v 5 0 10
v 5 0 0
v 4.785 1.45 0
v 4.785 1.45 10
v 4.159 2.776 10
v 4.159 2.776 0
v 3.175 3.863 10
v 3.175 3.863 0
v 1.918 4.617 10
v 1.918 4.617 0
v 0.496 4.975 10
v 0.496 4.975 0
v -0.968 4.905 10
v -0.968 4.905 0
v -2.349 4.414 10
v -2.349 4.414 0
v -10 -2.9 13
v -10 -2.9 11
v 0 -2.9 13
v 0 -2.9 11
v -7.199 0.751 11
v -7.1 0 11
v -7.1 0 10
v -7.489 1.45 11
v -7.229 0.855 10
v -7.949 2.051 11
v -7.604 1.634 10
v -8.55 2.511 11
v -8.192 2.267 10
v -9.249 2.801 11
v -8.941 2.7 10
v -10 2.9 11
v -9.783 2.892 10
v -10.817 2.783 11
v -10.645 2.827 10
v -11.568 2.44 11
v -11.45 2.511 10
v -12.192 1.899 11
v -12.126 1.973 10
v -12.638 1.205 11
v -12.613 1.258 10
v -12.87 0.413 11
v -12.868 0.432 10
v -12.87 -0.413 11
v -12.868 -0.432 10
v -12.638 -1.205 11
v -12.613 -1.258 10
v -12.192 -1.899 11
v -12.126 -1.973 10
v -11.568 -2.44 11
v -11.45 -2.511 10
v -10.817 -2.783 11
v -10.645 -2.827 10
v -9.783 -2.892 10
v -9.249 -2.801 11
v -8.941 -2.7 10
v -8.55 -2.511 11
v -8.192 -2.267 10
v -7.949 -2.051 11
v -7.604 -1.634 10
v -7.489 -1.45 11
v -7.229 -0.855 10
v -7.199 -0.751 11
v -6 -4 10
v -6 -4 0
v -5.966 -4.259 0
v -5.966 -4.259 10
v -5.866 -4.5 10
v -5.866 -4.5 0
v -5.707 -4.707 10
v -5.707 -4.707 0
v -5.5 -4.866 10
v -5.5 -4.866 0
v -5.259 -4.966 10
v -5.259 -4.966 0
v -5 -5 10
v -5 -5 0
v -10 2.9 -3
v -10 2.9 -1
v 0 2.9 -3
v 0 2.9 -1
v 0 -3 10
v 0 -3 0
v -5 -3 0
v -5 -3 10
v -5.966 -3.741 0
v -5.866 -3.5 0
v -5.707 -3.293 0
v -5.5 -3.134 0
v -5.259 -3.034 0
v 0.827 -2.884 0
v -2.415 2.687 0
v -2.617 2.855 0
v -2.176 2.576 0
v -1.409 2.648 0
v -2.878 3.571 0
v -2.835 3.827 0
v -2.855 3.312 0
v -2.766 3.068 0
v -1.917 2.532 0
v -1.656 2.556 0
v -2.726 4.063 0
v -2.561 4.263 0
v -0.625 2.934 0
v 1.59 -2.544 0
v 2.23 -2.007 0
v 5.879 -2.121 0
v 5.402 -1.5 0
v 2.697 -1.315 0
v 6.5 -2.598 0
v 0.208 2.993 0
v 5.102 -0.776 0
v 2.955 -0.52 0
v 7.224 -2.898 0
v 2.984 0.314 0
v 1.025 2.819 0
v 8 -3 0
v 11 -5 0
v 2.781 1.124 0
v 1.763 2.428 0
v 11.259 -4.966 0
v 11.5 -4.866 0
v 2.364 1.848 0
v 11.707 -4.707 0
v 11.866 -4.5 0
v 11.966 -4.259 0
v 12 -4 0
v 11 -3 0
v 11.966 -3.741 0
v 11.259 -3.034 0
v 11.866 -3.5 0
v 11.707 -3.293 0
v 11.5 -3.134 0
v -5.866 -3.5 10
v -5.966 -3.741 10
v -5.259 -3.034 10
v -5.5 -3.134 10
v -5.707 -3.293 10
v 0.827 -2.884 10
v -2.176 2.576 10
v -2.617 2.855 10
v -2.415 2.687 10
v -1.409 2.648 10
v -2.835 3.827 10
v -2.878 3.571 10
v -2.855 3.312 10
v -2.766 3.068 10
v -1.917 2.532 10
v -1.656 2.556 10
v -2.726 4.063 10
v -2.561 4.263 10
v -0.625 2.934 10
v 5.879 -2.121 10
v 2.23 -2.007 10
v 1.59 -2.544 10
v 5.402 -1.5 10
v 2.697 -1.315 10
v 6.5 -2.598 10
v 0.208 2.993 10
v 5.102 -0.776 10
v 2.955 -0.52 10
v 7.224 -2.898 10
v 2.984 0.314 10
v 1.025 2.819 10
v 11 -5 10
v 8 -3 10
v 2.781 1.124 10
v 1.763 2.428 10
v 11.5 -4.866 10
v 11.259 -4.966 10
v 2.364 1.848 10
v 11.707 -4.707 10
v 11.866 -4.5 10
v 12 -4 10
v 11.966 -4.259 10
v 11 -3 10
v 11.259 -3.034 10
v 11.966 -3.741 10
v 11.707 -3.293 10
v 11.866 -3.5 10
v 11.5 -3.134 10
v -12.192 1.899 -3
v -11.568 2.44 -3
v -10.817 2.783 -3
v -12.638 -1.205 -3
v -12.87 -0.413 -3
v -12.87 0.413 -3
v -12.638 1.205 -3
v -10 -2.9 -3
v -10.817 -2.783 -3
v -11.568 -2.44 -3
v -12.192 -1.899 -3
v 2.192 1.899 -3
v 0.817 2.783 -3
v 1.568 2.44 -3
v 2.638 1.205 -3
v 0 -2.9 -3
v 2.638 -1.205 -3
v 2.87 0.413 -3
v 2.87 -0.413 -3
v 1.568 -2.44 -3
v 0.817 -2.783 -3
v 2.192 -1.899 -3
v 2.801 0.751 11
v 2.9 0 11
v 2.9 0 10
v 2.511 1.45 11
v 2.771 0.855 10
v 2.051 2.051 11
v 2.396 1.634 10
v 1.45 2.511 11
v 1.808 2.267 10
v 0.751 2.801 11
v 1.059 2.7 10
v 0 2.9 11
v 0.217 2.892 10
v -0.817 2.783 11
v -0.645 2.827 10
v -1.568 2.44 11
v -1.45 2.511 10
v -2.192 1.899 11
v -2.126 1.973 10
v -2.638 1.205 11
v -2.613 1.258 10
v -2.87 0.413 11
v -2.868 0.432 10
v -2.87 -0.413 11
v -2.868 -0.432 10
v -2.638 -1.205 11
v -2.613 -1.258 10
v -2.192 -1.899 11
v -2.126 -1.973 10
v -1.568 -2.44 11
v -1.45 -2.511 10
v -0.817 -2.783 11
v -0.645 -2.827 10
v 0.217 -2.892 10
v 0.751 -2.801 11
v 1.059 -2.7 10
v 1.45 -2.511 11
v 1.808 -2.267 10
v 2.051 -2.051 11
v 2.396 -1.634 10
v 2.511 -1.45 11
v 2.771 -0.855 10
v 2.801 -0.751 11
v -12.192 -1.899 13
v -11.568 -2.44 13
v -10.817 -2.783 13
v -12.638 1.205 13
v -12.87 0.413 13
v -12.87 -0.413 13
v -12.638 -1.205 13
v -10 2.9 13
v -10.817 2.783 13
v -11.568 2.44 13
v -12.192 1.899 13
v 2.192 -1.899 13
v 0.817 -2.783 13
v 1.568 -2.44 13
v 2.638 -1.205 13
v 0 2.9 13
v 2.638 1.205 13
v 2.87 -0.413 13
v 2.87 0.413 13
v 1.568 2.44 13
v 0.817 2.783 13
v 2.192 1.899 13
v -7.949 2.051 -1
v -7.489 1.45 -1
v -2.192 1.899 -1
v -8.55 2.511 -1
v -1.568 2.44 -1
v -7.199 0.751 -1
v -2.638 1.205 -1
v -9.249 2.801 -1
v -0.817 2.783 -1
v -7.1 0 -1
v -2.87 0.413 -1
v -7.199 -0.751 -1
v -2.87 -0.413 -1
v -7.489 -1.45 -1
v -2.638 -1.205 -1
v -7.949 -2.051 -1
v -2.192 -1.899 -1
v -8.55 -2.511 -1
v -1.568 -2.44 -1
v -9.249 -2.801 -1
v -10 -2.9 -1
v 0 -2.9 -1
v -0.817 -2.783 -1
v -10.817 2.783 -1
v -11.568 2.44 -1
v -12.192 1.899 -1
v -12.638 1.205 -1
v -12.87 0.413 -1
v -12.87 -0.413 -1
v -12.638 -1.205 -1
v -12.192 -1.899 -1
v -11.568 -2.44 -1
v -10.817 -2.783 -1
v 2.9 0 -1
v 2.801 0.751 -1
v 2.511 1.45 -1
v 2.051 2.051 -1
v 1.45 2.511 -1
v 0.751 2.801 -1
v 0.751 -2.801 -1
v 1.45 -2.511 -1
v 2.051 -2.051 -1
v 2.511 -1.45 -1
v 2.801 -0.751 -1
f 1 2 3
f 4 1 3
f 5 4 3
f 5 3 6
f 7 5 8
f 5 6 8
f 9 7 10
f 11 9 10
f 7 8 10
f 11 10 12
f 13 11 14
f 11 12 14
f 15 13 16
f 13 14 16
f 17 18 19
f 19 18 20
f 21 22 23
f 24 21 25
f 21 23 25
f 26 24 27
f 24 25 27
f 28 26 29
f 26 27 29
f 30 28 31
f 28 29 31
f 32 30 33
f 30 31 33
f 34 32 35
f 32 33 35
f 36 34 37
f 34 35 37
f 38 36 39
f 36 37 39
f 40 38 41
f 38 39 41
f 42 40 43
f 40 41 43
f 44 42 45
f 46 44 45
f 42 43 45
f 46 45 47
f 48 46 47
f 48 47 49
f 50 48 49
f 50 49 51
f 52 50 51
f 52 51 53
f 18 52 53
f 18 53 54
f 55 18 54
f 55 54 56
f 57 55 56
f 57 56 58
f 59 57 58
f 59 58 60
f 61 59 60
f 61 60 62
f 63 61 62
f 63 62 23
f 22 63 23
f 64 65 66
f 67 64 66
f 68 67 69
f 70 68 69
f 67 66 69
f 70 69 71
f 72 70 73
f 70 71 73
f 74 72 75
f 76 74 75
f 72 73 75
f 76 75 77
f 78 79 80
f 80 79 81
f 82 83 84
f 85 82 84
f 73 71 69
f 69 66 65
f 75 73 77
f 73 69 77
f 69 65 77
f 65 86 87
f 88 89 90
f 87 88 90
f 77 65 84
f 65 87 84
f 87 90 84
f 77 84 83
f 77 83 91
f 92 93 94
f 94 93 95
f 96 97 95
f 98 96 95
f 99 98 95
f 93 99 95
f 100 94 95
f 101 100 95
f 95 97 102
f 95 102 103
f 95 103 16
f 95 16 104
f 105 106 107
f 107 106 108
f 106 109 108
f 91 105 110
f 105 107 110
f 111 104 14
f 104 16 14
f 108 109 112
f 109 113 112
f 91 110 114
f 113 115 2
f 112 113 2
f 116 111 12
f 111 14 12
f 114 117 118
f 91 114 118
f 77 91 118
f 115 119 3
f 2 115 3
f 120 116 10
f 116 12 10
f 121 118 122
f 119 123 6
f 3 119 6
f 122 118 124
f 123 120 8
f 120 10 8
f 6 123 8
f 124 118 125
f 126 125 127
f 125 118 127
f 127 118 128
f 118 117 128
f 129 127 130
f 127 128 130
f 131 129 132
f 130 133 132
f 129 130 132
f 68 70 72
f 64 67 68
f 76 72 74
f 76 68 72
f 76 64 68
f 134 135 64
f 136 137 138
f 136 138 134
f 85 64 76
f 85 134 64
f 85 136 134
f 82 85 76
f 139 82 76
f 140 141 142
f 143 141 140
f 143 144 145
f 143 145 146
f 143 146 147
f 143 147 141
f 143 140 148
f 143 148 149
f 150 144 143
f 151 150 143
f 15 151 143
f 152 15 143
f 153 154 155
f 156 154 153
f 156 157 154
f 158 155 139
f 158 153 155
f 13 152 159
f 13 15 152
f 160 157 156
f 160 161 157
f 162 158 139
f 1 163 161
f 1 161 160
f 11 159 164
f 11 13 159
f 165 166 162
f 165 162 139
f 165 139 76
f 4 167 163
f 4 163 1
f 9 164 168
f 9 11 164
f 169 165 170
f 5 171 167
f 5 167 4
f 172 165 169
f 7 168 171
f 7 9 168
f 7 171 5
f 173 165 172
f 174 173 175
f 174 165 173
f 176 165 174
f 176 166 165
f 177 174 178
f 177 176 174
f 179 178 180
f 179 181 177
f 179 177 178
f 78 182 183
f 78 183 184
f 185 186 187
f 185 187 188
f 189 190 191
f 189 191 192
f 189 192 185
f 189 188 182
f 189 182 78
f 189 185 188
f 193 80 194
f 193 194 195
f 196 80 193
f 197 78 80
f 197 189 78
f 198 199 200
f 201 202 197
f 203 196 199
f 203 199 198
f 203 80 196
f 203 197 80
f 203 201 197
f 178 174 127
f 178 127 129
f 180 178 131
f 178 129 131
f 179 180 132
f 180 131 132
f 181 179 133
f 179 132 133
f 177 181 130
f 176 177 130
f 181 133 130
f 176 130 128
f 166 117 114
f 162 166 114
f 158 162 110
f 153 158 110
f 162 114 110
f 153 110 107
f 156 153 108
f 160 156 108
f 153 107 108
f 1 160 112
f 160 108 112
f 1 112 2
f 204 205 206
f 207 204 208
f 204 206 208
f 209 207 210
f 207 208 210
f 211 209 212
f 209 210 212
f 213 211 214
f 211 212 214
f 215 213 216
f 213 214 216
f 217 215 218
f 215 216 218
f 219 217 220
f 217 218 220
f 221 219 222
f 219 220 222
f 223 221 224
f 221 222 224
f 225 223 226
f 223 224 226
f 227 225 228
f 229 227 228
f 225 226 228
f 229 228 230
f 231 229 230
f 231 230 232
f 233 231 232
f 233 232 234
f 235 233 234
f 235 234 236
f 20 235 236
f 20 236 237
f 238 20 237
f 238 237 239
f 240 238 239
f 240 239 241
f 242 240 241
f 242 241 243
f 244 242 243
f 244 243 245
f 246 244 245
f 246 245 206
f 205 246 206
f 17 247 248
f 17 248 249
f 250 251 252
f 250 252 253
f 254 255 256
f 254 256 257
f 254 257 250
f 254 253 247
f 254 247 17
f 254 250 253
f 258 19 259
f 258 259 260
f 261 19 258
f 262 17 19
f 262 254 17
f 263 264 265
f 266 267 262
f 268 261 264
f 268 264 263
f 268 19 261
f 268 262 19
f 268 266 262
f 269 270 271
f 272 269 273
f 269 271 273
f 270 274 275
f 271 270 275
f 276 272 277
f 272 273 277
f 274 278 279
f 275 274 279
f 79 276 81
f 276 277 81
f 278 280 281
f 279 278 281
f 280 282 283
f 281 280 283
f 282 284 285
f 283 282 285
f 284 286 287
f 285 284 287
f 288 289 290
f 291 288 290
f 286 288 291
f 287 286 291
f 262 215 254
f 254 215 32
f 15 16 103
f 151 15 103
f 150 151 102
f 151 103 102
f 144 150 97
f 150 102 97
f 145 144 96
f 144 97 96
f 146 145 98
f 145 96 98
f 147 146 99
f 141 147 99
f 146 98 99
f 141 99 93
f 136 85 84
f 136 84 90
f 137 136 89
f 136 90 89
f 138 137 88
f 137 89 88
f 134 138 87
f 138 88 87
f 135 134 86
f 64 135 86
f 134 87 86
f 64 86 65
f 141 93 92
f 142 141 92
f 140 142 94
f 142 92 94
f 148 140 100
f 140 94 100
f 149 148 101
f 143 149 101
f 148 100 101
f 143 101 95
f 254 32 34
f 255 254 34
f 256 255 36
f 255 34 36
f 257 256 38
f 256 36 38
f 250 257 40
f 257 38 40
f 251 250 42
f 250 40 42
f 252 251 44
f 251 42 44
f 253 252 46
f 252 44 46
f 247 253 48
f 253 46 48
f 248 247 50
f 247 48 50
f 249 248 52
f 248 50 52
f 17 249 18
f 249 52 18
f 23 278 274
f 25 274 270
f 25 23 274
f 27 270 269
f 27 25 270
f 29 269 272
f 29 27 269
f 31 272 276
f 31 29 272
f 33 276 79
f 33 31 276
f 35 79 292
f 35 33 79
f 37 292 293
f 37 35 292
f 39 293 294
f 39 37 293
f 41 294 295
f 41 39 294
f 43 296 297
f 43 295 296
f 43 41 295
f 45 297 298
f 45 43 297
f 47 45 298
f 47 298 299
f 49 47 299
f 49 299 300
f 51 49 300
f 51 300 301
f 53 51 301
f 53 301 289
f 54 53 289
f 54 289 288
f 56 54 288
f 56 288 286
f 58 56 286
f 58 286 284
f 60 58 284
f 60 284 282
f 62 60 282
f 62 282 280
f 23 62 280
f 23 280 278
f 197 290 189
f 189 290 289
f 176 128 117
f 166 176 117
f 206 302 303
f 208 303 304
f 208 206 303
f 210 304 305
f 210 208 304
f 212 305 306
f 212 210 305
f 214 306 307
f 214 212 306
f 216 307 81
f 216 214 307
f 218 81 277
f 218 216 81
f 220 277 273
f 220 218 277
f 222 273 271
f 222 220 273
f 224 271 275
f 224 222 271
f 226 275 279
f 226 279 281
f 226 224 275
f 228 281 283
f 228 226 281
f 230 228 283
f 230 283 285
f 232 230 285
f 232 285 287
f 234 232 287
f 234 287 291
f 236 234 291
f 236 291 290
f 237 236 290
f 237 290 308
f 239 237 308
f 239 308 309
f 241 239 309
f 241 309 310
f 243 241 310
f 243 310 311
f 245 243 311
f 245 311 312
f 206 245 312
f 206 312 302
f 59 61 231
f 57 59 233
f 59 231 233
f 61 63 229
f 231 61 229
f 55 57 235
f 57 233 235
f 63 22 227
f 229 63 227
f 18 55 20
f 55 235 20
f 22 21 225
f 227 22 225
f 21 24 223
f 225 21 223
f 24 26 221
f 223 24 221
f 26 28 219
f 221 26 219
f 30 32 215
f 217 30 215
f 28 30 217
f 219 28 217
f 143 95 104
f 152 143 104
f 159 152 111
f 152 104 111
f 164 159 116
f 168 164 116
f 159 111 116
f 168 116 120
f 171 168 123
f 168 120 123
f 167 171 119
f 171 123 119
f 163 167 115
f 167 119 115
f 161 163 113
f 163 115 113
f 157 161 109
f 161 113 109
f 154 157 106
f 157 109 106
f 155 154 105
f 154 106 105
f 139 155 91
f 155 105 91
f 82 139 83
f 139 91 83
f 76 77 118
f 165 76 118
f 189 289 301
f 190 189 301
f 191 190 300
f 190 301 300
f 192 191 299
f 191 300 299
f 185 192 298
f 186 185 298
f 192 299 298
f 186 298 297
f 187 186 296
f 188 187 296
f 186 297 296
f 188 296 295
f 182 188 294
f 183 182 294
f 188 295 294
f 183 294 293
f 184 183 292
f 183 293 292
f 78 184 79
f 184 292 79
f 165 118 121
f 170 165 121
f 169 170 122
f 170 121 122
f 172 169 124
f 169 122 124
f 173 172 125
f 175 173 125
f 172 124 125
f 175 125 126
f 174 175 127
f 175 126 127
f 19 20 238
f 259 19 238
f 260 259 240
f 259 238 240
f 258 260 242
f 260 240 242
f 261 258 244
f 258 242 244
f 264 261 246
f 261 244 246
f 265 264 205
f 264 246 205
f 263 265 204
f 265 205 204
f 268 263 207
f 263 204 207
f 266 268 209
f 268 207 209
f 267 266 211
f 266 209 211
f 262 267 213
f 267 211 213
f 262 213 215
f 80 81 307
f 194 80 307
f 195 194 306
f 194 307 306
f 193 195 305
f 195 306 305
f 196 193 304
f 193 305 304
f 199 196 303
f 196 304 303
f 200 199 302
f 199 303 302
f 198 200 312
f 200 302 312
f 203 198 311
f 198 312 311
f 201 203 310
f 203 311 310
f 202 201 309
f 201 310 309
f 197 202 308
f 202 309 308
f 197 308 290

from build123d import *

# Parameters (mm, degrees)
F1_DEPTH      = 10
F2_R          = 2.9
F3_DEPTH      = 11
F3_DEPTH_BACK = 1
F5_DEPTH      = 2
F7_DEPTH      = 2


with BuildPart() as f1:
    # F0 (on Top) → F1 (new body)
    with BuildSketch(Plane.XY):
        with BuildLine():
            ThreePointArc((-1.4094542146, 2.648289791), (2.9107446962, 0.7263369146), (0, -3))
            Line((0, -3), (-5, -3))
            ThreePointArc((-5, -3), (-5.7071067812, -3.2928932188), (-6, -4))
            ThreePointArc((-6, -4), (-5.7071067812, -4.7071067812), (-5, -5))
            Line((-5, -5), (0, -5))
            Line((0, -5), (11, -5))
            ThreePointArc((11, -5), (11.7071067812, -4.7071067812), (12, -4))
            ThreePointArc((12, -4), (11.7071067812, -3.2928932188), (11, -3))
            Line((11, -3), (8, -3))
            ThreePointArc((8, -3), (5.8786796564, -2.1213203436), (5, 0))
            ThreePointArc((5, 0), (2.5743492587, 4.2863417846), (-2.3490903577, 4.4138163183))
            ThreePointArc((-2.3490903577, 4.4138163183), (-2.8648615599, 3.7002091465), (-2.616549623, 2.855462847))
            ThreePointArc((-2.616549623, 2.855462847), (-2.0484283781, 2.5454637808), (-1.4094542146, 2.648289791))
        make_face()
    extrude(amount=F1_DEPTH)


with BuildPart() as f3:
    # F2 (on face) → F3 (new body, two sides)
    with BuildSketch(Plane.XY.offset(10)) as f3_sk:
        Circle(F2_R)
    extrude(amount=-F3_DEPTH)
    extrude(f3_sk.sketch, amount=F3_DEPTH_BACK)



with BuildPart() as f3b:
    # F2 (on face) → F3, piece 2 (new body, two sides)
    with BuildSketch(Plane.XY.offset(10)) as f3_2_sk:
        with Locations((-10, 0)):
            Circle(F2_R)
    extrude(amount=-F3_DEPTH)
    extrude(f3_2_sk.sketch, amount=F3_DEPTH_BACK)


with BuildPart() as f3_1:
    add(f3.part)

    add(f3b.part)  # F5 merges F3b
    # F4 (on face) → F5 (join)
    with BuildSketch(Plane(origin=(0, 0, -1), x_dir=(1, 0, 0), z_dir=(0, 0, -1))):
        with BuildLine():
            Line((-10, -2.9), (0, -2.9))
            ThreePointArc((0, -2.9), (2.9, 0), (0, 2.9))
            Line((0, 2.9), (-10, 2.9))
            ThreePointArc((-10, 2.9), (-12.9, 0), (-10, -2.9))
        make_face()
    extrude(amount=F5_DEPTH)

    # F6 (on face) → F7 (join)
    with BuildSketch(Plane.XY.offset(11)):
        with BuildLine():
            Line((-10, -2.9), (0, -2.9))
            ThreePointArc((0, -2.9), (2.9, 0), (0, 2.9))
            Line((0, 2.9), (-10, 2.9))
            ThreePointArc((-10, 2.9), (-12.9, 0), (-10, -2.9))
        make_face()
    extrude(amount=F7_DEPTH)


solid = Compound([f1.part, f3_1.part])
